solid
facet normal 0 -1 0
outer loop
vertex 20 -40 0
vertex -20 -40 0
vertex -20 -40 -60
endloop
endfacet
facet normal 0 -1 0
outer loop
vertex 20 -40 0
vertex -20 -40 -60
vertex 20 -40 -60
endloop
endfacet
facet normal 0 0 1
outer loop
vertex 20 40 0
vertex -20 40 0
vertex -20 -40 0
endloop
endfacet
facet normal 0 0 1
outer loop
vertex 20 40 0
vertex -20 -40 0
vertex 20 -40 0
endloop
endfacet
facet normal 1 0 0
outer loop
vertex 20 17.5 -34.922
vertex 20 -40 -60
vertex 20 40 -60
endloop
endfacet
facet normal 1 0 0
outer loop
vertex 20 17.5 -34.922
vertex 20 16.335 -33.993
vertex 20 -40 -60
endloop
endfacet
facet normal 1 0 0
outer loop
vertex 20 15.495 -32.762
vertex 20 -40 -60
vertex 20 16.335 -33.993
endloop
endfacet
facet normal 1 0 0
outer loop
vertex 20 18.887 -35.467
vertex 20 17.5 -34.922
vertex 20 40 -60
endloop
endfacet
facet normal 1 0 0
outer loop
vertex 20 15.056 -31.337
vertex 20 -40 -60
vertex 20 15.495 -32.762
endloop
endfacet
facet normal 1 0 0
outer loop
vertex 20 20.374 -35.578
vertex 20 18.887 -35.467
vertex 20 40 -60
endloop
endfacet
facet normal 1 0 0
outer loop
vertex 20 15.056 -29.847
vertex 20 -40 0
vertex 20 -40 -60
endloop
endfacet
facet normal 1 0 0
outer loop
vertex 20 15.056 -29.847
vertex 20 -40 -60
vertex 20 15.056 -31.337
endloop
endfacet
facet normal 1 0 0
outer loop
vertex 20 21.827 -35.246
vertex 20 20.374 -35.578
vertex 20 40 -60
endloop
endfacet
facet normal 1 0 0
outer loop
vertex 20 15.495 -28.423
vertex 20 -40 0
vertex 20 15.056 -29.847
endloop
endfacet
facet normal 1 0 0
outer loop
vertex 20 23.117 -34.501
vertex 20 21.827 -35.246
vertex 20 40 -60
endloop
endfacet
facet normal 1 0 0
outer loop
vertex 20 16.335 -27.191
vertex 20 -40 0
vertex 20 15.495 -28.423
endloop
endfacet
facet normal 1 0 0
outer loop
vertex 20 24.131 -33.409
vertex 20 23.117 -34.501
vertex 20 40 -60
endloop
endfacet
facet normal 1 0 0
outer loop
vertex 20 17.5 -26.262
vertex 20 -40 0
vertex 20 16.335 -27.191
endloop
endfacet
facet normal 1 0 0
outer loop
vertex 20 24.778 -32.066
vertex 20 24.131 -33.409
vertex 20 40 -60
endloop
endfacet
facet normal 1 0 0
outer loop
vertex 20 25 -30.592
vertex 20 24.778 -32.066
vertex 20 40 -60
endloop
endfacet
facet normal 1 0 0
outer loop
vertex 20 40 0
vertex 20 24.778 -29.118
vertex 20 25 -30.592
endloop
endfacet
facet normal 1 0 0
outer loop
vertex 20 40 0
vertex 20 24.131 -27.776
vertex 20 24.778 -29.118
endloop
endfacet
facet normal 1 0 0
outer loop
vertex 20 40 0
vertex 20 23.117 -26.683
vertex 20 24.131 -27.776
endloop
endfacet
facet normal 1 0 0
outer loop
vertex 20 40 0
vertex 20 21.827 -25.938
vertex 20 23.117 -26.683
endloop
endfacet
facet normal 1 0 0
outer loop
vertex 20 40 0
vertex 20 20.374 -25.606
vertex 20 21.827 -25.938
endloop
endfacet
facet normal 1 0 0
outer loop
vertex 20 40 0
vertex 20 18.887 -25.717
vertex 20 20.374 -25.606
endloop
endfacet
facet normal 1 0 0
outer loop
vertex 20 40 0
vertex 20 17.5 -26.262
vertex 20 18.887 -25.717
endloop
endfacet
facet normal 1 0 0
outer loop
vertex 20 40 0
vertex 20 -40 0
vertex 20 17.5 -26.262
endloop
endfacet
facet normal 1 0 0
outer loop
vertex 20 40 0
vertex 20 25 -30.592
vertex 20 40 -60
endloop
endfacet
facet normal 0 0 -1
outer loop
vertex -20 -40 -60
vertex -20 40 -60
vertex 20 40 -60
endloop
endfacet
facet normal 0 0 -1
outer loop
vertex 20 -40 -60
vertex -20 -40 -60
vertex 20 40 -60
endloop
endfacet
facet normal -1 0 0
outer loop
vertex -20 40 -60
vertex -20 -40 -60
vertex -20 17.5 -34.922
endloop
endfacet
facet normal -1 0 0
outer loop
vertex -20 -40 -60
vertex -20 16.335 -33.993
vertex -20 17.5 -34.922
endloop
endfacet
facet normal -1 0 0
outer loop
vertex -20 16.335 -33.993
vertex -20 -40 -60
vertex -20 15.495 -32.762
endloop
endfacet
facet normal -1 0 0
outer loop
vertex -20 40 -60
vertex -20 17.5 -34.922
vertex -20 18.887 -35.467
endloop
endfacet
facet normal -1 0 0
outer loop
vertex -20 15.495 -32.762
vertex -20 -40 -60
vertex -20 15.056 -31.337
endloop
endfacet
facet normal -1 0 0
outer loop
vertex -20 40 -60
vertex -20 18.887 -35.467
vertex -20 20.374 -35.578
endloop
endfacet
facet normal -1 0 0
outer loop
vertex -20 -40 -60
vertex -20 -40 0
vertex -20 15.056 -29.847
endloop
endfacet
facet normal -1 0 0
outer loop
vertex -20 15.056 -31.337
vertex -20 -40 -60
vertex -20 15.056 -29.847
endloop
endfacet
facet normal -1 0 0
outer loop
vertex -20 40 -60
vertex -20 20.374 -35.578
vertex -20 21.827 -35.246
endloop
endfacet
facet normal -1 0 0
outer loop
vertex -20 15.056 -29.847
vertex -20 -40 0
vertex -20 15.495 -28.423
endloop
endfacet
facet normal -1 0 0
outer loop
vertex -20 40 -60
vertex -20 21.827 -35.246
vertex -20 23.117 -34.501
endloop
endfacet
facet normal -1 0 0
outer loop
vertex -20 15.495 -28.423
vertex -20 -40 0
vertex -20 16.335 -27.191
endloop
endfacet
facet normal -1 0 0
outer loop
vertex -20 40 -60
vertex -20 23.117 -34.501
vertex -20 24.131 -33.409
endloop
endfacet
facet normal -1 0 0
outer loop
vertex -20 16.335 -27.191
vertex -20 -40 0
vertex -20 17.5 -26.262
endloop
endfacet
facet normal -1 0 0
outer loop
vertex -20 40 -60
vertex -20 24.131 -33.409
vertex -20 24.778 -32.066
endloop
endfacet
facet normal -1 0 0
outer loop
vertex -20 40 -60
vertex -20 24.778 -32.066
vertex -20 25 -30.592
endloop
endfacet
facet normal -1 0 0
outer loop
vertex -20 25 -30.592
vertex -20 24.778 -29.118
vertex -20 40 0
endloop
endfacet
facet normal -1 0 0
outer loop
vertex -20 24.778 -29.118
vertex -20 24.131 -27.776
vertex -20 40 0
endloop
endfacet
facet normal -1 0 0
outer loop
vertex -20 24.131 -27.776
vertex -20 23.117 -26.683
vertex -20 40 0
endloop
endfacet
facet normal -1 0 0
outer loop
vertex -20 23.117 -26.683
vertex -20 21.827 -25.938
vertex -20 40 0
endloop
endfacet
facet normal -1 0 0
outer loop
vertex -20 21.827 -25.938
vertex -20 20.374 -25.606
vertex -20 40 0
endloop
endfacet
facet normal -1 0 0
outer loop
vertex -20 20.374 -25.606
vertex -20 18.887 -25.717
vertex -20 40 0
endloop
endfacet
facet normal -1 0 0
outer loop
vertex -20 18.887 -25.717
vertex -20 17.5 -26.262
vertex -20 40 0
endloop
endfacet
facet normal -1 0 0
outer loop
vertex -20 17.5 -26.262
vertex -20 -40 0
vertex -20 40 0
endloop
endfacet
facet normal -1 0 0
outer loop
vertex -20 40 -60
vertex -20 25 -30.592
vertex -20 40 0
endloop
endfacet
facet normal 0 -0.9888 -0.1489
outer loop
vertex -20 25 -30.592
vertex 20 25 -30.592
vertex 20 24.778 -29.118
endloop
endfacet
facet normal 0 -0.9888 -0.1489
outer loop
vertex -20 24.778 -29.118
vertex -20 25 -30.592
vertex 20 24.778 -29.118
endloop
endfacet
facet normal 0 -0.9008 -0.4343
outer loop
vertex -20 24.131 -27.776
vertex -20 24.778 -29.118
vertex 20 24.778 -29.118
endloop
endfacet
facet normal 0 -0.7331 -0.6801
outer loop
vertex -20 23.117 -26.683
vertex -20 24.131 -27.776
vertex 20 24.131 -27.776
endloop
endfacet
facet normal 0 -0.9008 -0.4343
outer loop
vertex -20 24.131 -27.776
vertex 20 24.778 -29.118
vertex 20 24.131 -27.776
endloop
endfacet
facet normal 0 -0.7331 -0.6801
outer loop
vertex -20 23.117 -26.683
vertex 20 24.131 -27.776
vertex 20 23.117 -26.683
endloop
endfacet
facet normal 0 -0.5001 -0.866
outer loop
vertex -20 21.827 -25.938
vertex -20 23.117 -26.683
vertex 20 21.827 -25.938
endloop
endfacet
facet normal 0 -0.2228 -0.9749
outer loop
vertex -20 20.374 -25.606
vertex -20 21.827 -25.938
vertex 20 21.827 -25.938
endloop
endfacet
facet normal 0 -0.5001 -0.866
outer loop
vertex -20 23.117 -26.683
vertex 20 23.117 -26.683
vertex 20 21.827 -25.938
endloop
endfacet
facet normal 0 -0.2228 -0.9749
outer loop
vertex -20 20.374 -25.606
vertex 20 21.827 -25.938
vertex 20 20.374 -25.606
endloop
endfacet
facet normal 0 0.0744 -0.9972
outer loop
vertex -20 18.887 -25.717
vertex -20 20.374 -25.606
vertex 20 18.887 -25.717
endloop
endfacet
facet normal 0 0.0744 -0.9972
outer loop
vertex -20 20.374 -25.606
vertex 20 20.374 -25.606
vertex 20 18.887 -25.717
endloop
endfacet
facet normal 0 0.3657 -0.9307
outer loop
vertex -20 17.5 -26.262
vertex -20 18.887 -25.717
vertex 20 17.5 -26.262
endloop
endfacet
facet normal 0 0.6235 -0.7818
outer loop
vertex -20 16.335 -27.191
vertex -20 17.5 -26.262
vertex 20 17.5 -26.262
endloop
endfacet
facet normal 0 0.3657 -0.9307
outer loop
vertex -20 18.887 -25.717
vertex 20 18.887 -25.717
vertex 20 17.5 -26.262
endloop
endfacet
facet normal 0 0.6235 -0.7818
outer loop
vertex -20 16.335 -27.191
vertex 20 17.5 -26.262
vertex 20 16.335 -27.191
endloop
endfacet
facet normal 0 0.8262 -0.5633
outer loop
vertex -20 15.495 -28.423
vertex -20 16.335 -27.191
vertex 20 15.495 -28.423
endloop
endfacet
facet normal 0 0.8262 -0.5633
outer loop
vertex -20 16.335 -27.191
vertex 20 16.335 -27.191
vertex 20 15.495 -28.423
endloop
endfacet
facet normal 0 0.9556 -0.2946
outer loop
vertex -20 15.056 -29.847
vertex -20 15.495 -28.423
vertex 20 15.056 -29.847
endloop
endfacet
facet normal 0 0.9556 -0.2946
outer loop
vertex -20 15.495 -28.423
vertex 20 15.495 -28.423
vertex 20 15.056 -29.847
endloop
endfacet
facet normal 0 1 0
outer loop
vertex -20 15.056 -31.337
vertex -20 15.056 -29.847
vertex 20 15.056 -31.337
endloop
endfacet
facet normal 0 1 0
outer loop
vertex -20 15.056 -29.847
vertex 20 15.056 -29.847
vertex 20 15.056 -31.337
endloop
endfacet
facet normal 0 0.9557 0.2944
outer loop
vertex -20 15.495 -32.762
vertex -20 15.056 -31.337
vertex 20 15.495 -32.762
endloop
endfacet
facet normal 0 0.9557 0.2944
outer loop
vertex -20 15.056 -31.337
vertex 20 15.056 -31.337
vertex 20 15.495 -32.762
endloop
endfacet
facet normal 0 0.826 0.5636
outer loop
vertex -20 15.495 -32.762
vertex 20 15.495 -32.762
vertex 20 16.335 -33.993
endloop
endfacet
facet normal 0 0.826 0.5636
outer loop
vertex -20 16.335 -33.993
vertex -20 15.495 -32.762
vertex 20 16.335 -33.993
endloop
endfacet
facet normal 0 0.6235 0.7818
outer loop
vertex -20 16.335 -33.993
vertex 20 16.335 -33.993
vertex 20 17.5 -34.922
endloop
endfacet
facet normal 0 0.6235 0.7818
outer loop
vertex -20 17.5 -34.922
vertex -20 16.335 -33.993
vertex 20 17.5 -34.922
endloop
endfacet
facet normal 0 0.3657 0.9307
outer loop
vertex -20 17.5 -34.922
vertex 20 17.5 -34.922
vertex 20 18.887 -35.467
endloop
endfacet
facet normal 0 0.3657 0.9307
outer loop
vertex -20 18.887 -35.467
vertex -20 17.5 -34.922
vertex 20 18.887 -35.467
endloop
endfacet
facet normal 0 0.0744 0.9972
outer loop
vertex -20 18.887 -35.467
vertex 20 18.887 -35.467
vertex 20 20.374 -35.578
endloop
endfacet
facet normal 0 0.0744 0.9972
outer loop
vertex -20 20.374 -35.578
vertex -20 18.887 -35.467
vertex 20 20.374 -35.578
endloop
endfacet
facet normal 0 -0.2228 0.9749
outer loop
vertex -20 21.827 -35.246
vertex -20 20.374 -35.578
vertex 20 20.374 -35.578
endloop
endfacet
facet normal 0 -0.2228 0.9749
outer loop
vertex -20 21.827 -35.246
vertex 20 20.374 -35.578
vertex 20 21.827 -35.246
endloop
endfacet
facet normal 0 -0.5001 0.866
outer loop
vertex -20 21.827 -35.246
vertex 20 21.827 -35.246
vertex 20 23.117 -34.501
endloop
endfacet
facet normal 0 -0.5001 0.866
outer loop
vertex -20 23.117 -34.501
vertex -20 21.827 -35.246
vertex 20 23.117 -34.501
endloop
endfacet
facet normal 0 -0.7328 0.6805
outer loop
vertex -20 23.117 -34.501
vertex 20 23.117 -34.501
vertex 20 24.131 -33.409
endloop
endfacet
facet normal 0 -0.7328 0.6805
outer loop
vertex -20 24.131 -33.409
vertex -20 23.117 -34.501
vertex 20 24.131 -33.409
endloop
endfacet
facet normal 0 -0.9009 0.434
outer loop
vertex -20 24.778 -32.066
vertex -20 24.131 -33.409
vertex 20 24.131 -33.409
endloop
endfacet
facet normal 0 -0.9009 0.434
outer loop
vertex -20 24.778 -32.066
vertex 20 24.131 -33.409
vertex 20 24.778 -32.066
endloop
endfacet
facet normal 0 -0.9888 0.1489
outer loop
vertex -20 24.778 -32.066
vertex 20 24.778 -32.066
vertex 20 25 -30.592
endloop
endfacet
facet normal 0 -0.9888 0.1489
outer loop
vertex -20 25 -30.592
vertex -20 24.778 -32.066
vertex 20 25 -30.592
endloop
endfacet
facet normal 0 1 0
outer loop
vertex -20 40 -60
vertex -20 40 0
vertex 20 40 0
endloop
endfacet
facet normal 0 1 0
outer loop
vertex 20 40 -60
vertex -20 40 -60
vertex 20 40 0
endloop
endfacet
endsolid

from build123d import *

# Parameters (mm, degrees)
F0_W     = 40
F0_H     = 80
F1_DEPTH = 60
F2_R     = 5
F3_DEPTH = 40.001


with BuildPart() as f1:
    # F0 (on Top) → F1 (new body)
    with BuildSketch(Plane.XY):
        Rectangle(F0_W, F0_H)
    extrude(amount=-F1_DEPTH)

    # F2 (on face) → F3 (cut, through all)
    with BuildSketch(Plane.YZ.offset(20)):
        with Locations((20, -30.592106)):
            Circle(F2_R)
    extrude(amount=-F3_DEPTH, mode=Mode.SUBTRACT)


solid = f1.part
